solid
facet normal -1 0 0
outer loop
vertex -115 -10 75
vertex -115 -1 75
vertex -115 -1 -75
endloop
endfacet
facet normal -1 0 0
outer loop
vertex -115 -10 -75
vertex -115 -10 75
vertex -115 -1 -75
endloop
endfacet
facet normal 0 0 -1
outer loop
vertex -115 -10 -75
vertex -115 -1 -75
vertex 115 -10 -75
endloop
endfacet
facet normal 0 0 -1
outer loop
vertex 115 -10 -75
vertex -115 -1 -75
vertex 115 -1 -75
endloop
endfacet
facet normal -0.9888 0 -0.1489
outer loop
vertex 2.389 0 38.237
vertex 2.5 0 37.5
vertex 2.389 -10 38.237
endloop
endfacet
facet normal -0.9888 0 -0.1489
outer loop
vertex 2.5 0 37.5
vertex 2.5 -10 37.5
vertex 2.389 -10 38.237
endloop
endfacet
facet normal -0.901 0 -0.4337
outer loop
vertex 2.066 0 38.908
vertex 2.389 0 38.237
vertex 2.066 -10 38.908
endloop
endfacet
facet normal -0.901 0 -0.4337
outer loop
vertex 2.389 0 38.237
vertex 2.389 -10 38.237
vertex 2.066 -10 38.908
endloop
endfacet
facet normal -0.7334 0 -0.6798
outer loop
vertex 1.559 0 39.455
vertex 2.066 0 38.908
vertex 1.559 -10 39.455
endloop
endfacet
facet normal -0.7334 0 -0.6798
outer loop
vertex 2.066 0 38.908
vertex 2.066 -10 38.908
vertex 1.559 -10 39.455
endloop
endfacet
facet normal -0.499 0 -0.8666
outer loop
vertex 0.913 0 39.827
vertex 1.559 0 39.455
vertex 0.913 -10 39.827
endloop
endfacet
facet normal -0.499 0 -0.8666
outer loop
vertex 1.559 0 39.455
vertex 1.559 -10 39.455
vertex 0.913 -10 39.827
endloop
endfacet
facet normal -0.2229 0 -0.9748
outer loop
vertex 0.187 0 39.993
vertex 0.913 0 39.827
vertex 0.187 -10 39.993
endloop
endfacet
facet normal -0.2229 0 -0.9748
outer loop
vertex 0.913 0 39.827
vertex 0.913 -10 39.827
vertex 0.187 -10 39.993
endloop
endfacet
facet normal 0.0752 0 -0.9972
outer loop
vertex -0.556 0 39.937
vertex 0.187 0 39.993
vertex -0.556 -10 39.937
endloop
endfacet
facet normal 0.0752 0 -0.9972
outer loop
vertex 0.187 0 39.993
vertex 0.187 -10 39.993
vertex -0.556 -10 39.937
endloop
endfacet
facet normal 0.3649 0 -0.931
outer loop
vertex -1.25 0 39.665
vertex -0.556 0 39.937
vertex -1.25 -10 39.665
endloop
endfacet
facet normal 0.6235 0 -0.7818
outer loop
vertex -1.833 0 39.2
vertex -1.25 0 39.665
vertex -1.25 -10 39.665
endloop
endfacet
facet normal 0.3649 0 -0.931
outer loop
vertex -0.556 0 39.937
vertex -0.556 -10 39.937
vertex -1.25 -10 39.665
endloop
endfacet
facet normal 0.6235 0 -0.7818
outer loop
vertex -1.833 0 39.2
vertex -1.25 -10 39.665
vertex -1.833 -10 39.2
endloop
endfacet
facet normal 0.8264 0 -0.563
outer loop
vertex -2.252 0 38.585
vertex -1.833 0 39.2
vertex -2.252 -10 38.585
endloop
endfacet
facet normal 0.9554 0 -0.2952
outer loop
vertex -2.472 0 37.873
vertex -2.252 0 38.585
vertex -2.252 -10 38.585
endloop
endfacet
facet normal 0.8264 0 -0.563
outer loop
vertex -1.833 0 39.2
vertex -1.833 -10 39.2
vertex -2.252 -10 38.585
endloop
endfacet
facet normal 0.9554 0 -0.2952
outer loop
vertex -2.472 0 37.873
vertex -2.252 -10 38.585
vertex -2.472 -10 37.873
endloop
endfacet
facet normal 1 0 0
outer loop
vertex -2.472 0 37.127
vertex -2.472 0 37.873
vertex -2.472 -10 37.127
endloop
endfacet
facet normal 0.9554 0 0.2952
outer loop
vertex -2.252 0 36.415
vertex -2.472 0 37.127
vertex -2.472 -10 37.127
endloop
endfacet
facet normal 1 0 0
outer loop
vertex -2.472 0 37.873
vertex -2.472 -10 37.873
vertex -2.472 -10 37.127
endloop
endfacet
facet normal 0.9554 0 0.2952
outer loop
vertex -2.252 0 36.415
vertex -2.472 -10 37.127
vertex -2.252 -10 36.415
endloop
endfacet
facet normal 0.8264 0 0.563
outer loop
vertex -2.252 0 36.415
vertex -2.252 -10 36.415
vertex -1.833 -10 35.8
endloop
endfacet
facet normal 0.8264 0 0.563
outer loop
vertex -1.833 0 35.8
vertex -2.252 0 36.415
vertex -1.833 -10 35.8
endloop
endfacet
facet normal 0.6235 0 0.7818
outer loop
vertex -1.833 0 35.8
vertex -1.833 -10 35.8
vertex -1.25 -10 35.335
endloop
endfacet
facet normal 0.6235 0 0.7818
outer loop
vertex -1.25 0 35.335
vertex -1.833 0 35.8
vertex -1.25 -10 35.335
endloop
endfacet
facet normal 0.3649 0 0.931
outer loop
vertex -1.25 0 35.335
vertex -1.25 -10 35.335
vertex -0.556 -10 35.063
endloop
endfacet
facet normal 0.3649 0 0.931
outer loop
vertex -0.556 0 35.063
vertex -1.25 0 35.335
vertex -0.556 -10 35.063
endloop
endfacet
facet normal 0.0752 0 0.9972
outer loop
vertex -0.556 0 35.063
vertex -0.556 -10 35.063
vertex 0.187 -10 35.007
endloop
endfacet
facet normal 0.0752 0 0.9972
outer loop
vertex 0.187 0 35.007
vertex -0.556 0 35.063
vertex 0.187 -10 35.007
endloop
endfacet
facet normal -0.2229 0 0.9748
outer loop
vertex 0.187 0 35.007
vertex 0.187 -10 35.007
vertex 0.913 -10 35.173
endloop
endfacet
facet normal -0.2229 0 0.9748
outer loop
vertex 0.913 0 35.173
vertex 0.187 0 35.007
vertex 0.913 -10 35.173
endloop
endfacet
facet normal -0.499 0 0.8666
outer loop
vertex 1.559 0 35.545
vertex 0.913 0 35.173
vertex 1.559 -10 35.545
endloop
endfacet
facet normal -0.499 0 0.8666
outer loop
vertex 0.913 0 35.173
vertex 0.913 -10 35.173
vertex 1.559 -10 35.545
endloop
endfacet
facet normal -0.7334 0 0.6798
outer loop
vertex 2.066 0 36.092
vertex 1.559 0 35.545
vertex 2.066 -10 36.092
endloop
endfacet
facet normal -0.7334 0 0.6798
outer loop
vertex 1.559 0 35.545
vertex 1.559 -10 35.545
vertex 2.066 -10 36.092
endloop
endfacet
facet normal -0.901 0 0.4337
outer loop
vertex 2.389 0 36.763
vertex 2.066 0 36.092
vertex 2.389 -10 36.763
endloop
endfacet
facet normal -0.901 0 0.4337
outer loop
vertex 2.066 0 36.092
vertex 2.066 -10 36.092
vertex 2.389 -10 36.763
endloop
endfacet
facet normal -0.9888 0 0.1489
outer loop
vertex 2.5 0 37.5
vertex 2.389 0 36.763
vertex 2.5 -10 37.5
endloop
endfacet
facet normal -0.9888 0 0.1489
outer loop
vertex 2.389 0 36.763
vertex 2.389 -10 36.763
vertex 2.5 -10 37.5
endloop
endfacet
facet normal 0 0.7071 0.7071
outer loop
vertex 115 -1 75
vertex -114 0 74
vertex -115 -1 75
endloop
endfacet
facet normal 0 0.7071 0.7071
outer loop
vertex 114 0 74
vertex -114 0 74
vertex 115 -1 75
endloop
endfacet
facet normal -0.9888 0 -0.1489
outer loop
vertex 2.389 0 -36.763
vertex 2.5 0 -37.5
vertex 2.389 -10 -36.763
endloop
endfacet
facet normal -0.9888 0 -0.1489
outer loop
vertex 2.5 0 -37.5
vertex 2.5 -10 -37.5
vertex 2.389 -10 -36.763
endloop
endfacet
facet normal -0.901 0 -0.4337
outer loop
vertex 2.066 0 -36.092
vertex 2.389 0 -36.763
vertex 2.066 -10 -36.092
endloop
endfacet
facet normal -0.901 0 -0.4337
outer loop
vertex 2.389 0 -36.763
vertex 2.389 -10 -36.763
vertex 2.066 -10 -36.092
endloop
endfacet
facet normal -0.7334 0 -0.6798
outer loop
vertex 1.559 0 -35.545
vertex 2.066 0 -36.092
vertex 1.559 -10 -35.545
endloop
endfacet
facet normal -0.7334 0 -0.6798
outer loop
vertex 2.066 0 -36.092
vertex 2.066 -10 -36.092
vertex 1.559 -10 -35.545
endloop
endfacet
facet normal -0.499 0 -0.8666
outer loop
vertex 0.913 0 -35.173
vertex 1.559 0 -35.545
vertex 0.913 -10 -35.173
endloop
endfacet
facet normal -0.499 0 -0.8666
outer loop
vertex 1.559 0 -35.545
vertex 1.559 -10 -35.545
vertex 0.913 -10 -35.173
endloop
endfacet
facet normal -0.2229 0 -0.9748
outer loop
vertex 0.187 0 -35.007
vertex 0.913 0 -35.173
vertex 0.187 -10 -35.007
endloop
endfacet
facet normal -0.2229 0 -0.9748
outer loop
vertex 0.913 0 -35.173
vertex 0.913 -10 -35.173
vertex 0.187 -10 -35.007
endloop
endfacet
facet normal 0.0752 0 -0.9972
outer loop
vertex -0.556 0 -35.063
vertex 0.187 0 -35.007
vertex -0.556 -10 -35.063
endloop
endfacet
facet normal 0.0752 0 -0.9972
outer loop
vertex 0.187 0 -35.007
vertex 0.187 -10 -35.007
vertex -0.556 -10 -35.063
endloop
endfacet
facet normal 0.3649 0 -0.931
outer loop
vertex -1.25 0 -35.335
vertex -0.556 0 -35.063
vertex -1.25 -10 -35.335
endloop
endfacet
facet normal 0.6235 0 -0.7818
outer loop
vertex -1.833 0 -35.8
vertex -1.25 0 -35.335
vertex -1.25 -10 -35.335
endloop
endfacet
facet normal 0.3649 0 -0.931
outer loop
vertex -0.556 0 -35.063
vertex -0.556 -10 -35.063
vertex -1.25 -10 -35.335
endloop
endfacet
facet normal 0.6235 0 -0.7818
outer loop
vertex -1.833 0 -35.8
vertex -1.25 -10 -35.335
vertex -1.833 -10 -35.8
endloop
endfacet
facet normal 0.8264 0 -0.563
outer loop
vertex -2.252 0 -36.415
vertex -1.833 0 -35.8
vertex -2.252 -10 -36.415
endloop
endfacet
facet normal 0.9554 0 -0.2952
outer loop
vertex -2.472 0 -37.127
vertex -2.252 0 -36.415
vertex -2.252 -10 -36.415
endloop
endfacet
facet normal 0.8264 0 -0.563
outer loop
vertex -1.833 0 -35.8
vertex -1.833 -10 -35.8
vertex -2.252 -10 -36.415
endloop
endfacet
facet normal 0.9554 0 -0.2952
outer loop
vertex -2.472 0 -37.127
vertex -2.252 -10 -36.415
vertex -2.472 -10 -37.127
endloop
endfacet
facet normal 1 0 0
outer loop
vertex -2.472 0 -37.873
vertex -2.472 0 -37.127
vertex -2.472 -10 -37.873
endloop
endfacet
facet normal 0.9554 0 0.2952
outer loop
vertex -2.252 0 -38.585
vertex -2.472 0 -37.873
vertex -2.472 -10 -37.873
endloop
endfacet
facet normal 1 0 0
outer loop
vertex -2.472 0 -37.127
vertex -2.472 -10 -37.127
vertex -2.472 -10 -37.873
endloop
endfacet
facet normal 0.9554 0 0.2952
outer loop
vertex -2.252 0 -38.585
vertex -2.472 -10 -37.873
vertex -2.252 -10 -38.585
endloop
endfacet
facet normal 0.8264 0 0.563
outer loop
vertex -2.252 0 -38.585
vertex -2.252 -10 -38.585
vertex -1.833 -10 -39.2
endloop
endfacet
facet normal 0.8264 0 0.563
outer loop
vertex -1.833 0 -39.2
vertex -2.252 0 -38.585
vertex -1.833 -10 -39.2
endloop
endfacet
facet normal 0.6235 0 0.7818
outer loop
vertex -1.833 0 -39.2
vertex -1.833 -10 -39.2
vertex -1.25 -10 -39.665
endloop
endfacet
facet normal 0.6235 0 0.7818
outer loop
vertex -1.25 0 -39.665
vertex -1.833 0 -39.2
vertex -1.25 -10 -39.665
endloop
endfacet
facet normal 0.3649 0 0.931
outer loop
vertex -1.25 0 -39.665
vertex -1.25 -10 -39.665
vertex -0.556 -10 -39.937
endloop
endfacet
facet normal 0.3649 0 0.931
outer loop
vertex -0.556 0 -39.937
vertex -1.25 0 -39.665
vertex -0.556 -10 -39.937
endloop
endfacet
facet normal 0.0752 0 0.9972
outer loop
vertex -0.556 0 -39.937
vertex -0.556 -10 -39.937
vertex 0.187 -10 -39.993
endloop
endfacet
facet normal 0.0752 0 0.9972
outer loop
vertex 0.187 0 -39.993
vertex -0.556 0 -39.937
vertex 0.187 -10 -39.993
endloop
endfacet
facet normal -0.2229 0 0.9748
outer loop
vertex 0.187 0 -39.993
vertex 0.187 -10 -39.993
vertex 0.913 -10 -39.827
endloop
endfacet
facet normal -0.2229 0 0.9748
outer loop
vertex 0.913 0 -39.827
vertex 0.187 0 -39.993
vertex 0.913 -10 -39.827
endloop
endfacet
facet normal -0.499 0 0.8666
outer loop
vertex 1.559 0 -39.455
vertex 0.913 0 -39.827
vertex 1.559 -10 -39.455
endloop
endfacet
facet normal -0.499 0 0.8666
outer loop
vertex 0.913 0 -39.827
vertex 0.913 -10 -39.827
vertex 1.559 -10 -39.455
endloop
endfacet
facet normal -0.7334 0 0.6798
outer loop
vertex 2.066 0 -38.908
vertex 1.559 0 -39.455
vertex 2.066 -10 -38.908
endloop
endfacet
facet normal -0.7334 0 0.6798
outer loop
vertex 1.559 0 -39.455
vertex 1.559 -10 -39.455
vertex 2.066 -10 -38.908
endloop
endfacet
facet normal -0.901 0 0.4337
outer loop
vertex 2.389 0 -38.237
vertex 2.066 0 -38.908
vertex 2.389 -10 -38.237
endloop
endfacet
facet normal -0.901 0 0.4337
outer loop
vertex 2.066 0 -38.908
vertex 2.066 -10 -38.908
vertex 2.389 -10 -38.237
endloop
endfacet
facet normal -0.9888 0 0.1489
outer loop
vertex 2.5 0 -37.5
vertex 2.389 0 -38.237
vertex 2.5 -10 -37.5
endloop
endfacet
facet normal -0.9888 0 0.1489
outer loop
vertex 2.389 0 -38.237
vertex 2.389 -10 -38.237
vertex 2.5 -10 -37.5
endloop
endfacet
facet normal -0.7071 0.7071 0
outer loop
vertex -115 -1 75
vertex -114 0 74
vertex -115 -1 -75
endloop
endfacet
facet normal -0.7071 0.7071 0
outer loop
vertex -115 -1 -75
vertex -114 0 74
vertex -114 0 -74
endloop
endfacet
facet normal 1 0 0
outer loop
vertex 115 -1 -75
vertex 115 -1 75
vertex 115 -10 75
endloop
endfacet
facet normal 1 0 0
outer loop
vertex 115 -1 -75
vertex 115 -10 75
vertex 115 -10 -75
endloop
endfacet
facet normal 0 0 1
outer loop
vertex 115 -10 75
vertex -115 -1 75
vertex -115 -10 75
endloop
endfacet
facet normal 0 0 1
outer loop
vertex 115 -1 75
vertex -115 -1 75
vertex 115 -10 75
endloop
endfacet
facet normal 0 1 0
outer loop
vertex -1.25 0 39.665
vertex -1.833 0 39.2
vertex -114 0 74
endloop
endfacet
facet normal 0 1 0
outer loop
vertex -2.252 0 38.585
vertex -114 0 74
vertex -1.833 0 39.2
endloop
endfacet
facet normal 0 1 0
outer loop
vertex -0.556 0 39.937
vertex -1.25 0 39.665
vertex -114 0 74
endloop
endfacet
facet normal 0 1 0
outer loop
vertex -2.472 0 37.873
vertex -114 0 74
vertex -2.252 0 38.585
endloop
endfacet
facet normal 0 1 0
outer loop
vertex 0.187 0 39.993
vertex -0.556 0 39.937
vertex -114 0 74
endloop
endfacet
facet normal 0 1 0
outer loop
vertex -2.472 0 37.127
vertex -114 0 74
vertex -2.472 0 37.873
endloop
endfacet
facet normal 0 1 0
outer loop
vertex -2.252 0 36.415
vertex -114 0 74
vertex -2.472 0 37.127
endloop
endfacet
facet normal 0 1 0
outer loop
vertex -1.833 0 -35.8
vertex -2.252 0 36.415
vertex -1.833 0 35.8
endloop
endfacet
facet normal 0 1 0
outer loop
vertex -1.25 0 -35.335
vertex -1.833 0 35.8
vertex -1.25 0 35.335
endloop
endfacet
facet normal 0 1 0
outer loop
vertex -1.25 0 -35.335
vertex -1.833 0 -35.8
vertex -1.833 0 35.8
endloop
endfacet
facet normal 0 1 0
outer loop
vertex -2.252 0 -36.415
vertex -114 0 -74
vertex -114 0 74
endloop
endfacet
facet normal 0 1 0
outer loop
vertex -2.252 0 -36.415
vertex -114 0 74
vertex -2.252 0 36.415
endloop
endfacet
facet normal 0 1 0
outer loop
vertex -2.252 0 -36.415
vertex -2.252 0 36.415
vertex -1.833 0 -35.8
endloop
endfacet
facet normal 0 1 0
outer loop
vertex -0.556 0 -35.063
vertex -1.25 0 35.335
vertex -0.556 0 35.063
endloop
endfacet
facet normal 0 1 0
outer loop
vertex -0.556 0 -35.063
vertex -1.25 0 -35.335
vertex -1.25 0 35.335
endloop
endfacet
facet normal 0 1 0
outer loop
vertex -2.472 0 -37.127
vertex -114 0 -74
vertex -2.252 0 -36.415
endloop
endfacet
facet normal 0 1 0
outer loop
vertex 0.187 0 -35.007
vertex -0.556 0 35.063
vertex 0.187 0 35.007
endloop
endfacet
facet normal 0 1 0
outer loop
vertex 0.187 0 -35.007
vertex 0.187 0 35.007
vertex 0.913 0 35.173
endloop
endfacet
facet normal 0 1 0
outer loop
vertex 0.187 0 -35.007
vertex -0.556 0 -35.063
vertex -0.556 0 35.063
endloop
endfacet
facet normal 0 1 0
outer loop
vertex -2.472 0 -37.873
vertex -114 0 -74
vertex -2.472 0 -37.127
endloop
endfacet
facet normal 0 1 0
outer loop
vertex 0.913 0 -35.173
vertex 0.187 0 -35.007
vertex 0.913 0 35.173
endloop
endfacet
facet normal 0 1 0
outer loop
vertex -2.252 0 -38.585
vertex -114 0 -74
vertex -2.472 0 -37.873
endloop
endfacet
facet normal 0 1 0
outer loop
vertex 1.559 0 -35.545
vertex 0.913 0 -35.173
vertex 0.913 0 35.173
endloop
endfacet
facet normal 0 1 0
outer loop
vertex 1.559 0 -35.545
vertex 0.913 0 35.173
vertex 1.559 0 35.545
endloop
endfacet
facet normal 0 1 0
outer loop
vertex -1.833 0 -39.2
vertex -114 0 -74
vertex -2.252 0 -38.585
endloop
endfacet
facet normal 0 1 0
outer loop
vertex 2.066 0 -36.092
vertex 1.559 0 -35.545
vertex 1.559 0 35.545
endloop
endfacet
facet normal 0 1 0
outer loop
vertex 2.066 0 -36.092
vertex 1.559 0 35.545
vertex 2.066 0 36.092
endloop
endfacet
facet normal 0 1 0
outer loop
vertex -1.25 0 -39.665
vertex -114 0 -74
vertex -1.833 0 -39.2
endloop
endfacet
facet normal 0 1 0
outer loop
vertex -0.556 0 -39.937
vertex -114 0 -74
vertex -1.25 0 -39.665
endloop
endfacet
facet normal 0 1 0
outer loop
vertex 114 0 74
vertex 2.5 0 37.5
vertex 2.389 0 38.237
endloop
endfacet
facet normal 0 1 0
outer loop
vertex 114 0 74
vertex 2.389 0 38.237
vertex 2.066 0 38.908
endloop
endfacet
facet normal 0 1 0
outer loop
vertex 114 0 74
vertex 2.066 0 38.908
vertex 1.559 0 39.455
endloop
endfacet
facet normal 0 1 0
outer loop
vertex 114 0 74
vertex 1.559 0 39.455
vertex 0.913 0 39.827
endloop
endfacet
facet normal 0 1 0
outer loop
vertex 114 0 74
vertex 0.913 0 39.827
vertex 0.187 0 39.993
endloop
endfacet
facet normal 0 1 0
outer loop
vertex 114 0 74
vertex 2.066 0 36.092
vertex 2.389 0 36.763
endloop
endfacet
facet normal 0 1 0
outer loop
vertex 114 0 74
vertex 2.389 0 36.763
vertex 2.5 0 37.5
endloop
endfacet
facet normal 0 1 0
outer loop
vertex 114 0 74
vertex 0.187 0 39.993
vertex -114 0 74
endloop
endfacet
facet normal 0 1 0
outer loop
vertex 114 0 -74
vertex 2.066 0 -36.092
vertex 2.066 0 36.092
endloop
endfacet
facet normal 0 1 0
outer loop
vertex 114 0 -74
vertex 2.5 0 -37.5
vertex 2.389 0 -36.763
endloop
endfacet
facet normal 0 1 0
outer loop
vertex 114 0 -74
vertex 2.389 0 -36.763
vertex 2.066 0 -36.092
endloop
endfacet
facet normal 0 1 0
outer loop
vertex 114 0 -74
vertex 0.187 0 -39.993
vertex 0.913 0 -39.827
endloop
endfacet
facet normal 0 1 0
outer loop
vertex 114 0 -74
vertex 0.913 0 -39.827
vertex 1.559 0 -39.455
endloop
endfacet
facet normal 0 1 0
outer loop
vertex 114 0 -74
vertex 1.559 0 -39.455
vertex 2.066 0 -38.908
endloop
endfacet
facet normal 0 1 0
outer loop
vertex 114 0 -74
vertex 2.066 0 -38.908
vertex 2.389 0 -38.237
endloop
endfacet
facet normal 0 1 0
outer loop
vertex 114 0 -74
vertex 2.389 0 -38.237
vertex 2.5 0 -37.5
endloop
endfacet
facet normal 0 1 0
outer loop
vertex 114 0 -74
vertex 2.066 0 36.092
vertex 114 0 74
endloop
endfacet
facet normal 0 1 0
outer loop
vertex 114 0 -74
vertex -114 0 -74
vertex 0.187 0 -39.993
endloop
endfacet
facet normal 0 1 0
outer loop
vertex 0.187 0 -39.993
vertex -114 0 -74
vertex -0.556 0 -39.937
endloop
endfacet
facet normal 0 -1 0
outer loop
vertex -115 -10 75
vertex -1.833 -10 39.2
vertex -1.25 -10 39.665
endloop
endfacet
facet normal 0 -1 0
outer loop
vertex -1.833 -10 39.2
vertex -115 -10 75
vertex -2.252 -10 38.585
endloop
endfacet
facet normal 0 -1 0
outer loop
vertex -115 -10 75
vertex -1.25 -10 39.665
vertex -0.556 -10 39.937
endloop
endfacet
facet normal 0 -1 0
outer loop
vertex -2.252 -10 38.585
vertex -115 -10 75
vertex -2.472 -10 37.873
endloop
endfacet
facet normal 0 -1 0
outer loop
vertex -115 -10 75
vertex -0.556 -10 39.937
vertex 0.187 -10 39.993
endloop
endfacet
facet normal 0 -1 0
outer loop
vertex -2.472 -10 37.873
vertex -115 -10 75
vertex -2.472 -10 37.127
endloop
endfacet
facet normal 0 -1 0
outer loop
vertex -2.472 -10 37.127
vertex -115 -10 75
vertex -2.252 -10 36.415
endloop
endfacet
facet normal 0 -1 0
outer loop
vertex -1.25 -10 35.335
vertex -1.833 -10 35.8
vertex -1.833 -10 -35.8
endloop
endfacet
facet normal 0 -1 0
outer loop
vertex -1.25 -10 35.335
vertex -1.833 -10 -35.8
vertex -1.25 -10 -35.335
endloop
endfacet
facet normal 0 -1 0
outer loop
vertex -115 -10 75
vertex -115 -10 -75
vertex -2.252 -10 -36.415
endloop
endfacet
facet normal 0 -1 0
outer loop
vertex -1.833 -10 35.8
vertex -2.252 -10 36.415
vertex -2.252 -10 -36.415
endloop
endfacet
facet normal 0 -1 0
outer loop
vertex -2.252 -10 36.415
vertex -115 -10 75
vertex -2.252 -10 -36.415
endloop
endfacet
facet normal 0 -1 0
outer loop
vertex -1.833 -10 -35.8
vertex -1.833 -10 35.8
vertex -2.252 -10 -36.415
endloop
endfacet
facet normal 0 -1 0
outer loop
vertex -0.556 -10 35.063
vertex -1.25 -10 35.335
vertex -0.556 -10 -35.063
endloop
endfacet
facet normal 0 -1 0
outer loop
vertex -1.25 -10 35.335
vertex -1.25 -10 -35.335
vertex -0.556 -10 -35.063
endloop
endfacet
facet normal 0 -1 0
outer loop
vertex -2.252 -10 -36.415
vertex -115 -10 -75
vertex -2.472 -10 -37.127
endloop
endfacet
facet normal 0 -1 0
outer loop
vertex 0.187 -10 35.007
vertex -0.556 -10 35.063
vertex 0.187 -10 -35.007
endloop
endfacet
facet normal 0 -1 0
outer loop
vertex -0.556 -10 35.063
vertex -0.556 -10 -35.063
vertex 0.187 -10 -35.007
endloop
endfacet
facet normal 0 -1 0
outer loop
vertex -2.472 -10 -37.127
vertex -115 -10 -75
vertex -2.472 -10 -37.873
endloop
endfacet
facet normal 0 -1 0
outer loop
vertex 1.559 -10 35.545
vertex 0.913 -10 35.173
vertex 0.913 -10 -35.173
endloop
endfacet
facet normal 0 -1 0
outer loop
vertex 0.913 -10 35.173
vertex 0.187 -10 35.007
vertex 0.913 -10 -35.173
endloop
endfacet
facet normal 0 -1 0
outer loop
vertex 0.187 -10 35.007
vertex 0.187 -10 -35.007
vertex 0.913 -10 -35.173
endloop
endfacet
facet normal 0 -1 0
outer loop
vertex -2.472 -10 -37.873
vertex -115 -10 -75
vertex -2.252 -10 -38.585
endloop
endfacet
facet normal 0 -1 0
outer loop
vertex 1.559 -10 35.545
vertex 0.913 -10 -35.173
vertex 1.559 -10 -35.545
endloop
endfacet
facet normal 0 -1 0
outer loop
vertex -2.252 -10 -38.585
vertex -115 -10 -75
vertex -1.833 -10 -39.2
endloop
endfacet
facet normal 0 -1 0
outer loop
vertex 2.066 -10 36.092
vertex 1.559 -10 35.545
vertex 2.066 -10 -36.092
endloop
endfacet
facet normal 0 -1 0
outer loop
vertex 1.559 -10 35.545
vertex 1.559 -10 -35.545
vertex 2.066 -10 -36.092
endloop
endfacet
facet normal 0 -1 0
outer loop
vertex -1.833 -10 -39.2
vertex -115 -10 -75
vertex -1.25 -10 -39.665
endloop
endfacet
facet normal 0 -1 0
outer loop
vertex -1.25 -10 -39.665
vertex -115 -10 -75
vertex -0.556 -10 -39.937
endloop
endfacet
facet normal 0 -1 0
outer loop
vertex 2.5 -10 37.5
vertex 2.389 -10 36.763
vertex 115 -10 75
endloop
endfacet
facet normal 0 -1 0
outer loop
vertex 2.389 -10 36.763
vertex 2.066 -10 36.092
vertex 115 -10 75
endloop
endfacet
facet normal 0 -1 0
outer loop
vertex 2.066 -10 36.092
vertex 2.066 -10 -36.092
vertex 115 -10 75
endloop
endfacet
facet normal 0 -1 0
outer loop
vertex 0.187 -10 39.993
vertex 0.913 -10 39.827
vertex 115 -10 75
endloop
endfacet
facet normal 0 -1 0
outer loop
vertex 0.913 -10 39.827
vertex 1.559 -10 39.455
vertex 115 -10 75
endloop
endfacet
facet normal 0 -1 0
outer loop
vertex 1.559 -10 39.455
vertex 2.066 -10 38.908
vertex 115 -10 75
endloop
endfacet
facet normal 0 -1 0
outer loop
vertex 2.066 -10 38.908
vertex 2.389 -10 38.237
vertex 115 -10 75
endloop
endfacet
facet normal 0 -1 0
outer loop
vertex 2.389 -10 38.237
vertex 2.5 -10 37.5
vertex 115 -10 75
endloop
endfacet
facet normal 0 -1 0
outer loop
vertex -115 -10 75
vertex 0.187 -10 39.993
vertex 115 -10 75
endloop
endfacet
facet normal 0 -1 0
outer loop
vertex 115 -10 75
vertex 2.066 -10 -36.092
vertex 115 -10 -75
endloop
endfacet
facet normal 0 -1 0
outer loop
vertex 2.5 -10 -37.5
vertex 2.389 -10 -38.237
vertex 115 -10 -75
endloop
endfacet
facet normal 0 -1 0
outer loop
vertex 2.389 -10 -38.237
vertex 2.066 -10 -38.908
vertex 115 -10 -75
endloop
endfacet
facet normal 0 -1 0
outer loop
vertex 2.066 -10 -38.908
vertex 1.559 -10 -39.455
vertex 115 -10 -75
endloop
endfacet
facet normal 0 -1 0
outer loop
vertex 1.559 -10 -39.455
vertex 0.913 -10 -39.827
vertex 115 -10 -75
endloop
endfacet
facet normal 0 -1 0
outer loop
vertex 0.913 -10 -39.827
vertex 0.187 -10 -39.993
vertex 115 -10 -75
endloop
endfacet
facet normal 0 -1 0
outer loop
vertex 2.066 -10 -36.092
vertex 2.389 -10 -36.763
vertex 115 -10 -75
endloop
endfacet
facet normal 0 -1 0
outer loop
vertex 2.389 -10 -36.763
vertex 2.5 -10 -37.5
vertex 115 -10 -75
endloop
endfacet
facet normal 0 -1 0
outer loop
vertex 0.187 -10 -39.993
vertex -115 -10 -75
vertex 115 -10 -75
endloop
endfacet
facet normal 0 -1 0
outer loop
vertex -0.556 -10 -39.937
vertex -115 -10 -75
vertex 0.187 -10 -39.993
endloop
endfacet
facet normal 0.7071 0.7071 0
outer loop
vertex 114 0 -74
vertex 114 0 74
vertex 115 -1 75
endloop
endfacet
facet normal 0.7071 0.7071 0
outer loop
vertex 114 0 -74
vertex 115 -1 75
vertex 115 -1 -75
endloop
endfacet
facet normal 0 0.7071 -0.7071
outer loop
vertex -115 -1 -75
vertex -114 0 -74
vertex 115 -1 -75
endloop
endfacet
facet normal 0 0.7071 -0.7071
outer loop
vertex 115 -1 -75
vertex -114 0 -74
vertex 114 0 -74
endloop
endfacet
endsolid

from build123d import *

# Parameters (mm, degrees)
SKETCH_1_W                = 230
SKETCH_1_H                = 150
EXTRUDE_1_DEPTH           = 10
CHAMFER_1_SIZE            = 1
F_5_0MM_DOWEL_HOLE1_D     = 5
F_5_0MM_DOWEL_HOLE1_DEPTH = 10
F_5_0MM_DOWEL_HOLE1_TIP   = 1.502151548


with BuildPart() as part:
    # Эскиз1 → Бобышка-Вытянуть1 (new body)
    with BuildSketch(Plane(origin=(0, 0, 0), x_dir=(1, 0, 0), z_dir=(0, 1, 0))):
        Rectangle(SKETCH_1_W, SKETCH_1_H)
    extrude(amount=-EXTRUDE_1_DEPTH)

    # Фаска1
    chamfer_1_edges = [part.edges().sort_by_distance(p)[0] for p in [
        (0, 0, 75),
        (-115, 0, 0),
        (0, 0, -75),
        (115, 0, 0),
    ]]
    chamfer(chamfer_1_edges, length=CHAMFER_1_SIZE)

    # Ø5.0mm Dowel Hole1
    with Locations(Plane(origin=(0, 0, 0), x_dir=(-1, 0, 0), z_dir=(0, 1, 0))):
        with Locations((0, 37.5), (0, -37.5)):
            Hole(F_5_0MM_DOWEL_HOLE1_D / 2, depth=F_5_0MM_DOWEL_HOLE1_DEPTH)
            with Locations((0, 0, -(F_5_0MM_DOWEL_HOLE1_DEPTH + F_5_0MM_DOWEL_HOLE1_TIP / 2))):  # 118° drill point
                Cone(0, F_5_0MM_DOWEL_HOLE1_D / 2, F_5_0MM_DOWEL_HOLE1_TIP, mode=Mode.SUBTRACT)


solid = part.part
